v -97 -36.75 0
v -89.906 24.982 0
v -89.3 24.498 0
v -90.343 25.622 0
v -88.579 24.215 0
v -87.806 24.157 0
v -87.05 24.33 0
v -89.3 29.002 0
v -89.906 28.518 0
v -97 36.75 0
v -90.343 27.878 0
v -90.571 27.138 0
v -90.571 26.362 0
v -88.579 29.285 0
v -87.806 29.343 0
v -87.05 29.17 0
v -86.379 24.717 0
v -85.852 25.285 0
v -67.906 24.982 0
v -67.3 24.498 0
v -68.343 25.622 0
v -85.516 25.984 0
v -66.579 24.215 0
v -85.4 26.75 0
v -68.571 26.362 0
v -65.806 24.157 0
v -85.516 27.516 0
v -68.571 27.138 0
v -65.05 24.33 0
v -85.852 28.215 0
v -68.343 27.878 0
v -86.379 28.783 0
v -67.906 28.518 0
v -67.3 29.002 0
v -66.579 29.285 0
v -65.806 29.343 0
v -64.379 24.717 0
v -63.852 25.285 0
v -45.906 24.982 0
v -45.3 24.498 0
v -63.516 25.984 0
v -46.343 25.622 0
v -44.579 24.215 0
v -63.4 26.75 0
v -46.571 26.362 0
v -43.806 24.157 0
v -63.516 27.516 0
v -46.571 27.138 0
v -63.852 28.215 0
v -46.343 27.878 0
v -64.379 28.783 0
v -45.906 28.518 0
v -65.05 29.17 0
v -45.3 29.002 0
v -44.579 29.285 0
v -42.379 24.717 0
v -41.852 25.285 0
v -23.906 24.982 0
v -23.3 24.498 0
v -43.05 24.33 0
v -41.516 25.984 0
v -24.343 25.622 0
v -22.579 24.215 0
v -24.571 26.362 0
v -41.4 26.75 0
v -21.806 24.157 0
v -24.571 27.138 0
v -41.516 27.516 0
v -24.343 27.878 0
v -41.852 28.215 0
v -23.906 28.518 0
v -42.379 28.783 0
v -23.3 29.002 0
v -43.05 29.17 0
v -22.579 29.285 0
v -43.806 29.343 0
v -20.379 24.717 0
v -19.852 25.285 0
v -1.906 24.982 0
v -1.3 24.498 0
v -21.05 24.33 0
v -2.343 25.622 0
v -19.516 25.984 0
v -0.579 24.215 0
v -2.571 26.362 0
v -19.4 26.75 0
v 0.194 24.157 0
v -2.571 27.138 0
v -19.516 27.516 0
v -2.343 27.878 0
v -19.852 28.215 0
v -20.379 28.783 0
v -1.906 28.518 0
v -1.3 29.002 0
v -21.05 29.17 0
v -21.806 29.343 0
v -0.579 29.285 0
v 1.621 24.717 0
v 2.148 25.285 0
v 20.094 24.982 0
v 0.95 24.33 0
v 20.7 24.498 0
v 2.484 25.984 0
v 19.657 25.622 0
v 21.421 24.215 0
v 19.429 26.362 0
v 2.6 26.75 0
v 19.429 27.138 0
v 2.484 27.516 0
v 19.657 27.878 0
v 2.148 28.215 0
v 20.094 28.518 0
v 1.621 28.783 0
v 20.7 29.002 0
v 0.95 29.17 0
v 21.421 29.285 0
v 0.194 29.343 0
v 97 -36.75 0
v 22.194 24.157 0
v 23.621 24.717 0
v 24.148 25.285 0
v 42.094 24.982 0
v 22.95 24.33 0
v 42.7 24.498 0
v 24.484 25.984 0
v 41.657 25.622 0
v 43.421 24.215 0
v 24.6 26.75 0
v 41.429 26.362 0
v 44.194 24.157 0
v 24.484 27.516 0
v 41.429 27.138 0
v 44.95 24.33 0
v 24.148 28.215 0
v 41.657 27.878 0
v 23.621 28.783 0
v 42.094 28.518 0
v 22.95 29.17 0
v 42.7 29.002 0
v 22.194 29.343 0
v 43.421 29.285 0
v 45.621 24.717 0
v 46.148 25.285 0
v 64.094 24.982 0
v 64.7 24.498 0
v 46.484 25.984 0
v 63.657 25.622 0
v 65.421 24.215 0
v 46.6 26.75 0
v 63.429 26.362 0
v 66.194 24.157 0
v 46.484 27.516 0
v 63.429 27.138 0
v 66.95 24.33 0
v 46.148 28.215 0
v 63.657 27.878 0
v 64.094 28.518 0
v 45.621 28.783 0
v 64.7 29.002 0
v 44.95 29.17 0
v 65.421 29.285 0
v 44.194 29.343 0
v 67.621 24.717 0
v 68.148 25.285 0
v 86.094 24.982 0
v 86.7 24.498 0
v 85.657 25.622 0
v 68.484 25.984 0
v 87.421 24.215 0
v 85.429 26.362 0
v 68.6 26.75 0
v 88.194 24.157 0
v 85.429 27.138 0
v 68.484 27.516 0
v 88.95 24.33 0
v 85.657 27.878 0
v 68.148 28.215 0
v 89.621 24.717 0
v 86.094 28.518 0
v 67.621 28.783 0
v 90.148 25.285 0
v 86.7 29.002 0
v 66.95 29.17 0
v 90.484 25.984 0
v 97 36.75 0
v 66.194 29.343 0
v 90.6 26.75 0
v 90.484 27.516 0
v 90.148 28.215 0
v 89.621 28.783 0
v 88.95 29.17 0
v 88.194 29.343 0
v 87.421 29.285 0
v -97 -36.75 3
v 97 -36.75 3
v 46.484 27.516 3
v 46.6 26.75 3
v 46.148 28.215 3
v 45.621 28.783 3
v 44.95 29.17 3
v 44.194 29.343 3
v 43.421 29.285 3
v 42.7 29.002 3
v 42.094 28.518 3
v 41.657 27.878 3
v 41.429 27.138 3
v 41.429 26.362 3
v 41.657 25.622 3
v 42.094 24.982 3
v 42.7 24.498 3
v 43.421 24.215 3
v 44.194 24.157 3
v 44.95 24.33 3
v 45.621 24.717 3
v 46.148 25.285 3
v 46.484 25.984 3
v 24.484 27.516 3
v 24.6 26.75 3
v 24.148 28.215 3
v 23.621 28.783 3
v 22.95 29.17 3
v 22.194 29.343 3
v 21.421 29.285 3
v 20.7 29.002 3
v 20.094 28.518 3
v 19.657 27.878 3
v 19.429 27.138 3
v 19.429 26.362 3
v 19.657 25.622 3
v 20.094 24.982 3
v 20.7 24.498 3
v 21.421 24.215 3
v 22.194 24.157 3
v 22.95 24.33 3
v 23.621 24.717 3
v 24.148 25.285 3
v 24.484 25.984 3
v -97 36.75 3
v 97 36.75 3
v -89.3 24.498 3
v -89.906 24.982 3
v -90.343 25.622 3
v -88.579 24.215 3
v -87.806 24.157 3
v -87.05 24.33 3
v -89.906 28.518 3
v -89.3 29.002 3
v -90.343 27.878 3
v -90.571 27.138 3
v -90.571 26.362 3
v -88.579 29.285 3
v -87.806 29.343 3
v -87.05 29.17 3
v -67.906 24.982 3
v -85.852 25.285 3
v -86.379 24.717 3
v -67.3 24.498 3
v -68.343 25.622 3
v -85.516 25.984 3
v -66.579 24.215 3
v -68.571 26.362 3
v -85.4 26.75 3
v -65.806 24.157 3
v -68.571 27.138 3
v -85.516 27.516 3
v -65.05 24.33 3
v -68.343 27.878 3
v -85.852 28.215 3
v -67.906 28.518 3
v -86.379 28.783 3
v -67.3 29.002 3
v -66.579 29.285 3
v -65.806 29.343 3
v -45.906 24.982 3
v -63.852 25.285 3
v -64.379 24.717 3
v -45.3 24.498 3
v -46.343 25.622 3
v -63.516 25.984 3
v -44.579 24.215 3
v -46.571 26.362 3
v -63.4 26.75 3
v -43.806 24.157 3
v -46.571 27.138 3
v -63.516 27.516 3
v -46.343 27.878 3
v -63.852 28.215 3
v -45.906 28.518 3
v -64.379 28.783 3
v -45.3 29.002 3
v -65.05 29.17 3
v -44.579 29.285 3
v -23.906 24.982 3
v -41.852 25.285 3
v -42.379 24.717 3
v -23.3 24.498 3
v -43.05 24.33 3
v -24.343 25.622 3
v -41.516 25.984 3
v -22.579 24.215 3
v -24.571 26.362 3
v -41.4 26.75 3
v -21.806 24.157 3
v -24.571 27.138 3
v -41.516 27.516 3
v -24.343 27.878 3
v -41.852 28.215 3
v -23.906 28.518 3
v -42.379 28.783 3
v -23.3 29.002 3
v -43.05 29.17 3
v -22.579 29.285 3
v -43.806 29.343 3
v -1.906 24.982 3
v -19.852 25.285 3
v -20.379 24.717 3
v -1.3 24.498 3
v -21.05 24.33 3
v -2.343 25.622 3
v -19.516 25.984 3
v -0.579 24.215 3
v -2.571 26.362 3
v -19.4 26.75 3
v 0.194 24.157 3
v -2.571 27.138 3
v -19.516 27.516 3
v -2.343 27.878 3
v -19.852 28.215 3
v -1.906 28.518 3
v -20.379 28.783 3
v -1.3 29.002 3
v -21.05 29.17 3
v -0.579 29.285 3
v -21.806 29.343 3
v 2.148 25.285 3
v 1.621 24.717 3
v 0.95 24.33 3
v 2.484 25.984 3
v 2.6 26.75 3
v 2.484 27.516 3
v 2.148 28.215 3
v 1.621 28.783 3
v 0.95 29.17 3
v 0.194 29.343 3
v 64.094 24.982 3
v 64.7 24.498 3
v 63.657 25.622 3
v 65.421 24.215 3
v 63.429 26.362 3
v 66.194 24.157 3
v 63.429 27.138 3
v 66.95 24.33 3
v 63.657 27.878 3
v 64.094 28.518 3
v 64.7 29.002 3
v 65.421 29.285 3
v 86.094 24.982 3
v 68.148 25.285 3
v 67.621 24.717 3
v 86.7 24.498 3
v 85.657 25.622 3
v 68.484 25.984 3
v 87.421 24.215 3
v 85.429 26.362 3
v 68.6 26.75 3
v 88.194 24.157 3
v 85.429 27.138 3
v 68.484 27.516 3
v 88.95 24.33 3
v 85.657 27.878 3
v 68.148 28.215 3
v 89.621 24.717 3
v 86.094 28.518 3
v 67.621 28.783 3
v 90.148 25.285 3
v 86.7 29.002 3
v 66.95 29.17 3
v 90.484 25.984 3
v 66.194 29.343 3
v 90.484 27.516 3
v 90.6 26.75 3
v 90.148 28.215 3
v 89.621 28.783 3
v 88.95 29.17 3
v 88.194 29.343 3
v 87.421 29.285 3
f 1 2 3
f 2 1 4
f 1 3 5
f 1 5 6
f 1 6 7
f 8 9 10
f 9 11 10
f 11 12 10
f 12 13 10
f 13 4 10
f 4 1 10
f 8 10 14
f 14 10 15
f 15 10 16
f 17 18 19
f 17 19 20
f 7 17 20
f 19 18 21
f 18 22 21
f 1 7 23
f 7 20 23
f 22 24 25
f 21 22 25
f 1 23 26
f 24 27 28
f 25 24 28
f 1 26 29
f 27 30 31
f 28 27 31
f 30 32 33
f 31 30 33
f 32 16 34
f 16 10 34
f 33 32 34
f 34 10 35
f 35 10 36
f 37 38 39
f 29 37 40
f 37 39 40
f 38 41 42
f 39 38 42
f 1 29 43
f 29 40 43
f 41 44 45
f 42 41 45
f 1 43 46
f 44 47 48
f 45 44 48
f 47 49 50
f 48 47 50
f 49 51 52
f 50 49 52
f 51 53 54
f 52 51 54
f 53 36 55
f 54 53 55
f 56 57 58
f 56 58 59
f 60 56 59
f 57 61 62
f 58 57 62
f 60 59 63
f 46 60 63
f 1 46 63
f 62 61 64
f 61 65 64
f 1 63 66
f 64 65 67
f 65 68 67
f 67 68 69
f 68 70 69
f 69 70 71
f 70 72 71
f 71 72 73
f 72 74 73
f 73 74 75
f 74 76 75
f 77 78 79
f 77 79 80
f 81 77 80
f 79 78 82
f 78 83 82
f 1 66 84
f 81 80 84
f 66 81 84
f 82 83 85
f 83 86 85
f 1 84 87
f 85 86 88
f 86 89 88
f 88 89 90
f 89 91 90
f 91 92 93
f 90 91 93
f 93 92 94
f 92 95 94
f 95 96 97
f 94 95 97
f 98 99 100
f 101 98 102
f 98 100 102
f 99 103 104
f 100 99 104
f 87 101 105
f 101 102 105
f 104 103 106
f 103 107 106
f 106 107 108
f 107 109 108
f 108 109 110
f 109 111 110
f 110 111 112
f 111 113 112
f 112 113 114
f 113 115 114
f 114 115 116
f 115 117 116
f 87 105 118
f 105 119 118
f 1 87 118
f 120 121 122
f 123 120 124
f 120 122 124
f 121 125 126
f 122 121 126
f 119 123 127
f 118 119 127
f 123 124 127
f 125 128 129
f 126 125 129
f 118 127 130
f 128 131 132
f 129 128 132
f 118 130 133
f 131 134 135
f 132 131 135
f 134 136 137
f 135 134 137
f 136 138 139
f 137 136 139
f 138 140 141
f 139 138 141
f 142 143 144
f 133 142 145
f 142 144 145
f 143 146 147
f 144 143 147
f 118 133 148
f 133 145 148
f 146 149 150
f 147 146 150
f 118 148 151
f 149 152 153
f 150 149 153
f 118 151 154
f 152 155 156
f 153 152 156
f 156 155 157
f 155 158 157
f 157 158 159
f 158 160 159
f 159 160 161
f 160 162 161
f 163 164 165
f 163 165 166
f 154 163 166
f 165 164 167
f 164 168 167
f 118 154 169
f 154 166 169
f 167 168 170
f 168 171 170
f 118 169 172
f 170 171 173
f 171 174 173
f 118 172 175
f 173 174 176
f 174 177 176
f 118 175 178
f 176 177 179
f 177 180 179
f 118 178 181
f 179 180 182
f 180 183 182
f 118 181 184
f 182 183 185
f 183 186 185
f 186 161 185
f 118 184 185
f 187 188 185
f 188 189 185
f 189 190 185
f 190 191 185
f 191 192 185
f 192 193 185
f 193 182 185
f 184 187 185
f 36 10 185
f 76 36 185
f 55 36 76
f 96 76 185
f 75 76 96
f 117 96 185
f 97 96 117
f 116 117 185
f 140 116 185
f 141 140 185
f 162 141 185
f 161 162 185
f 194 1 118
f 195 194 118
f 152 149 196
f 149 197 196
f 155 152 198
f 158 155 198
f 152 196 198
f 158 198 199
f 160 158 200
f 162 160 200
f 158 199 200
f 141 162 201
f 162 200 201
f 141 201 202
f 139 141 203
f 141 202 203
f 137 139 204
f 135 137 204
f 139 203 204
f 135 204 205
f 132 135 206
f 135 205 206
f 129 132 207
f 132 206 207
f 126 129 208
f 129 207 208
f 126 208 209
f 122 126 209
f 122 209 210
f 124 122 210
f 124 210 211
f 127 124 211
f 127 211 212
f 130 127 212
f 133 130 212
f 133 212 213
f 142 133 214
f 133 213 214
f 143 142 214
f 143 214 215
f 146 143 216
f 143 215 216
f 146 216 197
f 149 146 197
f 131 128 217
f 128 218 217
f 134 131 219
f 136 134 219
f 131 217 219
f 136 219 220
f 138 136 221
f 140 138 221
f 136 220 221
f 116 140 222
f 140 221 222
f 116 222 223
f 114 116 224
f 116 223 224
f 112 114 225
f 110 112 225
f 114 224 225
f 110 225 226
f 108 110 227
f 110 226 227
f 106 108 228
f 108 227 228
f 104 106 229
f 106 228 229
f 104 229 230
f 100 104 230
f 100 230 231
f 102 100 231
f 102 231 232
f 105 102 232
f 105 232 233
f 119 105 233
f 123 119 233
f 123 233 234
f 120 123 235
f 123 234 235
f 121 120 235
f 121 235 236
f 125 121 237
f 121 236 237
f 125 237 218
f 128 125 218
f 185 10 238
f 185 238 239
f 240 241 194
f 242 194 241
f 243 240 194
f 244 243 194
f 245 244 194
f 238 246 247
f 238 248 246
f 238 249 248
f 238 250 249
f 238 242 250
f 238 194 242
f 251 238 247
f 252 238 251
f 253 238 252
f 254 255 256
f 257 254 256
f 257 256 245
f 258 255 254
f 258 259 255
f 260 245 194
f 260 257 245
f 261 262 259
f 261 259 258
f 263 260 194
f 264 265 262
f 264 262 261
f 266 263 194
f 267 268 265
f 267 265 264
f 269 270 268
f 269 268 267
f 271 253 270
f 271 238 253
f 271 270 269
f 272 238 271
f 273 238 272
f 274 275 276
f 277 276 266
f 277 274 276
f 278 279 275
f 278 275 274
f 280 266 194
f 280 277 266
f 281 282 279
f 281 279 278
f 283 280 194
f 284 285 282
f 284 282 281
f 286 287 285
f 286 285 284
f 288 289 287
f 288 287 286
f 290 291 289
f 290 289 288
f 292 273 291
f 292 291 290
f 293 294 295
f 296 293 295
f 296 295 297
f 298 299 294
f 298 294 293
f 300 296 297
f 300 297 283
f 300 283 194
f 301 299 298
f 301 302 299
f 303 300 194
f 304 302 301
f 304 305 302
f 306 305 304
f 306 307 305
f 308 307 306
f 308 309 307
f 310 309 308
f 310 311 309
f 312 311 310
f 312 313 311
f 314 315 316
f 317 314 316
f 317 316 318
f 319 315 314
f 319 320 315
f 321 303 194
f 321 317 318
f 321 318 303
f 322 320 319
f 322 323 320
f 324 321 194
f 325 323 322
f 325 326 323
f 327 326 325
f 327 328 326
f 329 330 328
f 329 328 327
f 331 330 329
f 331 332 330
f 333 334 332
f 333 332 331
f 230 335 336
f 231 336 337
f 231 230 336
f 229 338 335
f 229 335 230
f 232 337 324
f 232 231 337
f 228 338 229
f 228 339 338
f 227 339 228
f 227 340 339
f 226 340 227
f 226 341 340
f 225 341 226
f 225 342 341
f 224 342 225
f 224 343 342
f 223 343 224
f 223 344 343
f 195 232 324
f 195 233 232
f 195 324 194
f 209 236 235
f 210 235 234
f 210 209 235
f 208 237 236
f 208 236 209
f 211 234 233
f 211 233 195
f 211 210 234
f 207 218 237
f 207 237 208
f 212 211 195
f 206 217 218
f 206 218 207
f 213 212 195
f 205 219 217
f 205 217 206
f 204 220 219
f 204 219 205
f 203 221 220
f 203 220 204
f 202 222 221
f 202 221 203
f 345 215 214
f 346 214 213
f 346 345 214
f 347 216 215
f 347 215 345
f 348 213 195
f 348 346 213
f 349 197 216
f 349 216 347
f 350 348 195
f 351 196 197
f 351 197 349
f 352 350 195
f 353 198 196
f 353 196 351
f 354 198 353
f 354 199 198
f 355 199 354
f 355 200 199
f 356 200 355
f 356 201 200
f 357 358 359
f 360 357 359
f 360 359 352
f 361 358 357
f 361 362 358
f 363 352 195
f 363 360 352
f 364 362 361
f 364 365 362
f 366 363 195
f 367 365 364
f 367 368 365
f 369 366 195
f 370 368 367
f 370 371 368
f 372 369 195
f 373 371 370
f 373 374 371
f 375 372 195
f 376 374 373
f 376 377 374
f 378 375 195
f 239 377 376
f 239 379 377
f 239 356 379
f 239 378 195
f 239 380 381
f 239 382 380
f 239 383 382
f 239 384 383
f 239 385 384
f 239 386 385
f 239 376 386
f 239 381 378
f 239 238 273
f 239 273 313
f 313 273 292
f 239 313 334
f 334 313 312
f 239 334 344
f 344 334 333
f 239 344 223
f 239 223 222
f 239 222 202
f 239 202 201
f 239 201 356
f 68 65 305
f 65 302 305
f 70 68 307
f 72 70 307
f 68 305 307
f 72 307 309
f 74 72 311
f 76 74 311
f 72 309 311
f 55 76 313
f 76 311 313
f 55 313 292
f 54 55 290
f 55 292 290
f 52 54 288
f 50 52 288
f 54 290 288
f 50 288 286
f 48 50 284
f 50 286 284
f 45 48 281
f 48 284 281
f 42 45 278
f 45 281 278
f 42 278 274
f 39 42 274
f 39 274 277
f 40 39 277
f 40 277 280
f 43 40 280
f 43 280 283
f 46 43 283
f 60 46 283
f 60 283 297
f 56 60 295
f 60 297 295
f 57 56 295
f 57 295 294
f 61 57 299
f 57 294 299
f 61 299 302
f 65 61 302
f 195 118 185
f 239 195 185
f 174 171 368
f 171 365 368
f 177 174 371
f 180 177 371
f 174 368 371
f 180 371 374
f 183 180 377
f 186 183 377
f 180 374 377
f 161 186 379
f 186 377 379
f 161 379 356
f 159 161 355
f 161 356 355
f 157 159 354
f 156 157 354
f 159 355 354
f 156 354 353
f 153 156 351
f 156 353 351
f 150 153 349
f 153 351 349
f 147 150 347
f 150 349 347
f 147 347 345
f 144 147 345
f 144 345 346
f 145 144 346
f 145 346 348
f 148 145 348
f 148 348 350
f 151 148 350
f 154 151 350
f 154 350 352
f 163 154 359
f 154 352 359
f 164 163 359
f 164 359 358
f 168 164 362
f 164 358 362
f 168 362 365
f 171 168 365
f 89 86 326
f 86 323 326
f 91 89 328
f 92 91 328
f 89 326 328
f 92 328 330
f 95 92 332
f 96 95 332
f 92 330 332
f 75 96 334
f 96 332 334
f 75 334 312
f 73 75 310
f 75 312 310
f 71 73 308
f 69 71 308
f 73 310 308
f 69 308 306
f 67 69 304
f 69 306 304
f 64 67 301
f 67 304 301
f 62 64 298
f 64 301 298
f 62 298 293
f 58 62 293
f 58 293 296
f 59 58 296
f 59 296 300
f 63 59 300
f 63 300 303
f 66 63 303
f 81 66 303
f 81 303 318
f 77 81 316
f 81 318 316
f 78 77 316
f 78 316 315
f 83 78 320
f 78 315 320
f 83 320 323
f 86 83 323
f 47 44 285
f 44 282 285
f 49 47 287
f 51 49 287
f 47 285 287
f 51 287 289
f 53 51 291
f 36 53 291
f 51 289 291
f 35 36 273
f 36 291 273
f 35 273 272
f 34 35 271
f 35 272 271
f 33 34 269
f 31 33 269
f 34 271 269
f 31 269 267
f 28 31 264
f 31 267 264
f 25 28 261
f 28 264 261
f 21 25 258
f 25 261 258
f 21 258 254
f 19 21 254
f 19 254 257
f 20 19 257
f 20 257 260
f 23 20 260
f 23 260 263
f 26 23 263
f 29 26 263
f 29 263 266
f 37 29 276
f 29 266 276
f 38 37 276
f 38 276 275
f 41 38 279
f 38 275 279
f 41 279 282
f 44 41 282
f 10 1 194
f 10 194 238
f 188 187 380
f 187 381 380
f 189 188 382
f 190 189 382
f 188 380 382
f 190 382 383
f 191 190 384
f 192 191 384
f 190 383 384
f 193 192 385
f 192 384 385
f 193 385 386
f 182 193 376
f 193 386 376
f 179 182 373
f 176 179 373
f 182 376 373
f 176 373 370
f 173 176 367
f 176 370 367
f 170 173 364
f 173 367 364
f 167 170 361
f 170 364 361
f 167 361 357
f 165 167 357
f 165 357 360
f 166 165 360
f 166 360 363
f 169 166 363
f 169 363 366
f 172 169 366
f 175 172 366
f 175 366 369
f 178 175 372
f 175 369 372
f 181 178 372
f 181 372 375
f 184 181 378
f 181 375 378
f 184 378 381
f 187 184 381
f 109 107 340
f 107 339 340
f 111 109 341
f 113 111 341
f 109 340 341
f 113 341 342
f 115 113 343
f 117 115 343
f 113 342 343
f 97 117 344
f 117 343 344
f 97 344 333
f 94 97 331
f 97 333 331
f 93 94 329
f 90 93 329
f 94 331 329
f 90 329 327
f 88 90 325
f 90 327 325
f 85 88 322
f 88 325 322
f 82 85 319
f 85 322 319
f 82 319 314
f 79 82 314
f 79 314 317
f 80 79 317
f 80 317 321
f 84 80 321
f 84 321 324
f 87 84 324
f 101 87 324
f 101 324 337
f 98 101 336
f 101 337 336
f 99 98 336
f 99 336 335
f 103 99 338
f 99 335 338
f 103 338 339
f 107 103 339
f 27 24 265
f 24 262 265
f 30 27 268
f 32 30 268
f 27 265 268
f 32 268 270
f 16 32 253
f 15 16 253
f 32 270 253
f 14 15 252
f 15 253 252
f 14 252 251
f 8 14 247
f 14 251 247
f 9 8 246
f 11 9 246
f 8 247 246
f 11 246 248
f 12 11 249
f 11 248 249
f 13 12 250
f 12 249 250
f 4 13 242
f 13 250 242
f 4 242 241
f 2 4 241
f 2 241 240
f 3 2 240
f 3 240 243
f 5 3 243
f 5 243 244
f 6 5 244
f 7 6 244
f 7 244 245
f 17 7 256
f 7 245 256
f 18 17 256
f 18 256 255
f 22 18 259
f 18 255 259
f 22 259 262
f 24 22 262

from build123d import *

# Parameters (mm, degrees)
SKETCH_1_W                 = 200
SKETCH_1_H                 = 73.5
EXTRUDE_1_DEPTH            = 3
SKETCH_2_R                 = 2.6
CUT_EXTRUDE_2_DEPTH        = 107.581248351
PATTERN_LINEAR_1_COUNT     = 5
PATTERN_LINEAR_1_PITCH     = 22
PATTERN_LINEAR_1_COL_COUNT = 5
PATTERN_LINEAR_1_COL_PITCH = 22
CUT_EXTRUDE_3_DEPTH        = 107.581248351
CUT_EXTRUDE_3_DEPTH_BACK   = 107.581248351
SKETCH_3_W                 = 3
SKETCH_3_H                 = 73.5


with BuildPart() as part:
    # 草图1 → 凸台-拉伸1 (new body)
    with BuildSketch(Plane.XY):
        Rectangle(SKETCH_1_W, SKETCH_1_H)
    extrude(amount=EXTRUDE_1_DEPTH)

    # 草图2 → 切除-拉伸2 (cut, symmetric)
    with BuildSketch(Plane.XY.offset(3)):
        with Locations((0, 26.75)):
            Circle(SKETCH_2_R)
    cut_extrude_2 = extrude(amount=CUT_EXTRUDE_2_DEPTH, both=True, mode=Mode.SUBTRACT)

    # 阵列(线性)1: 切除-拉伸2 ×5
    with Locations(*[(i * PATTERN_LINEAR_1_PITCH, 0, 0) for i in range(1, PATTERN_LINEAR_1_COUNT)]):
        add(cut_extrude_2, mode=Mode.SUBTRACT)

    # 阵列(线性)1 col: 切除-拉伸2 ×5
    with Locations(*[(-i * PATTERN_LINEAR_1_COL_PITCH, 0, 0) for i in range(1, PATTERN_LINEAR_1_COL_COUNT)]):
        add(cut_extrude_2, mode=Mode.SUBTRACT)

    # 草图3 → 切除-拉伸3 (cut, two sides: drawn at the far end of the back side and taken through both)
    with BuildSketch(Plane.XY.offset(3).offset(-CUT_EXTRUDE_3_DEPTH_BACK)):
        with Locations((-98.5, 0)):
            Rectangle(SKETCH_3_W, SKETCH_3_H)
        with Locations((98.5, 0)):
            Rectangle(SKETCH_3_W, SKETCH_3_H)
    extrude(amount=CUT_EXTRUDE_3_DEPTH + CUT_EXTRUDE_3_DEPTH_BACK, mode=Mode.SUBTRACT)


solid = part.part
